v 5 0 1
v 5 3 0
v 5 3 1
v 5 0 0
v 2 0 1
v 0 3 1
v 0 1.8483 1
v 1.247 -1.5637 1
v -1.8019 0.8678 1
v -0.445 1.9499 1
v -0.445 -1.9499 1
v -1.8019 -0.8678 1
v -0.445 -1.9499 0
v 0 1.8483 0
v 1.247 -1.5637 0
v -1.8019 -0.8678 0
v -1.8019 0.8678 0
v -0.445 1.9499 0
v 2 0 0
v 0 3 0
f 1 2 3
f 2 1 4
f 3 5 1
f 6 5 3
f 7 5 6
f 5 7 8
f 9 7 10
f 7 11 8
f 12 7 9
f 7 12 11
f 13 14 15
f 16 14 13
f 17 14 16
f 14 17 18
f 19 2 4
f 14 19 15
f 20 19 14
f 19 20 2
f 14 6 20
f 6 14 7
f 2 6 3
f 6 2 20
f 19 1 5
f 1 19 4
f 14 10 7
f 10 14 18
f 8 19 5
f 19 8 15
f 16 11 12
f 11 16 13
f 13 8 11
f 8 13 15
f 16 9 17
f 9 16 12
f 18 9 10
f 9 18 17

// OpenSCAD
// V-003 — Integration Verification Backlog V3: assign(...) ≡ let(...) for a binding-preserving
// rewrite (SB5001). OpenSCAD 2021.01 still evaluates assign() (with a DEPRECATED warning the
// bundle is allowed to shed); the bundle rewrites it to let(...) and must render identically.
assign(w = 5, h = 3) { cube([w, h, 1]); }
assign(d = 2) cylinder(r = d, h = 1);
